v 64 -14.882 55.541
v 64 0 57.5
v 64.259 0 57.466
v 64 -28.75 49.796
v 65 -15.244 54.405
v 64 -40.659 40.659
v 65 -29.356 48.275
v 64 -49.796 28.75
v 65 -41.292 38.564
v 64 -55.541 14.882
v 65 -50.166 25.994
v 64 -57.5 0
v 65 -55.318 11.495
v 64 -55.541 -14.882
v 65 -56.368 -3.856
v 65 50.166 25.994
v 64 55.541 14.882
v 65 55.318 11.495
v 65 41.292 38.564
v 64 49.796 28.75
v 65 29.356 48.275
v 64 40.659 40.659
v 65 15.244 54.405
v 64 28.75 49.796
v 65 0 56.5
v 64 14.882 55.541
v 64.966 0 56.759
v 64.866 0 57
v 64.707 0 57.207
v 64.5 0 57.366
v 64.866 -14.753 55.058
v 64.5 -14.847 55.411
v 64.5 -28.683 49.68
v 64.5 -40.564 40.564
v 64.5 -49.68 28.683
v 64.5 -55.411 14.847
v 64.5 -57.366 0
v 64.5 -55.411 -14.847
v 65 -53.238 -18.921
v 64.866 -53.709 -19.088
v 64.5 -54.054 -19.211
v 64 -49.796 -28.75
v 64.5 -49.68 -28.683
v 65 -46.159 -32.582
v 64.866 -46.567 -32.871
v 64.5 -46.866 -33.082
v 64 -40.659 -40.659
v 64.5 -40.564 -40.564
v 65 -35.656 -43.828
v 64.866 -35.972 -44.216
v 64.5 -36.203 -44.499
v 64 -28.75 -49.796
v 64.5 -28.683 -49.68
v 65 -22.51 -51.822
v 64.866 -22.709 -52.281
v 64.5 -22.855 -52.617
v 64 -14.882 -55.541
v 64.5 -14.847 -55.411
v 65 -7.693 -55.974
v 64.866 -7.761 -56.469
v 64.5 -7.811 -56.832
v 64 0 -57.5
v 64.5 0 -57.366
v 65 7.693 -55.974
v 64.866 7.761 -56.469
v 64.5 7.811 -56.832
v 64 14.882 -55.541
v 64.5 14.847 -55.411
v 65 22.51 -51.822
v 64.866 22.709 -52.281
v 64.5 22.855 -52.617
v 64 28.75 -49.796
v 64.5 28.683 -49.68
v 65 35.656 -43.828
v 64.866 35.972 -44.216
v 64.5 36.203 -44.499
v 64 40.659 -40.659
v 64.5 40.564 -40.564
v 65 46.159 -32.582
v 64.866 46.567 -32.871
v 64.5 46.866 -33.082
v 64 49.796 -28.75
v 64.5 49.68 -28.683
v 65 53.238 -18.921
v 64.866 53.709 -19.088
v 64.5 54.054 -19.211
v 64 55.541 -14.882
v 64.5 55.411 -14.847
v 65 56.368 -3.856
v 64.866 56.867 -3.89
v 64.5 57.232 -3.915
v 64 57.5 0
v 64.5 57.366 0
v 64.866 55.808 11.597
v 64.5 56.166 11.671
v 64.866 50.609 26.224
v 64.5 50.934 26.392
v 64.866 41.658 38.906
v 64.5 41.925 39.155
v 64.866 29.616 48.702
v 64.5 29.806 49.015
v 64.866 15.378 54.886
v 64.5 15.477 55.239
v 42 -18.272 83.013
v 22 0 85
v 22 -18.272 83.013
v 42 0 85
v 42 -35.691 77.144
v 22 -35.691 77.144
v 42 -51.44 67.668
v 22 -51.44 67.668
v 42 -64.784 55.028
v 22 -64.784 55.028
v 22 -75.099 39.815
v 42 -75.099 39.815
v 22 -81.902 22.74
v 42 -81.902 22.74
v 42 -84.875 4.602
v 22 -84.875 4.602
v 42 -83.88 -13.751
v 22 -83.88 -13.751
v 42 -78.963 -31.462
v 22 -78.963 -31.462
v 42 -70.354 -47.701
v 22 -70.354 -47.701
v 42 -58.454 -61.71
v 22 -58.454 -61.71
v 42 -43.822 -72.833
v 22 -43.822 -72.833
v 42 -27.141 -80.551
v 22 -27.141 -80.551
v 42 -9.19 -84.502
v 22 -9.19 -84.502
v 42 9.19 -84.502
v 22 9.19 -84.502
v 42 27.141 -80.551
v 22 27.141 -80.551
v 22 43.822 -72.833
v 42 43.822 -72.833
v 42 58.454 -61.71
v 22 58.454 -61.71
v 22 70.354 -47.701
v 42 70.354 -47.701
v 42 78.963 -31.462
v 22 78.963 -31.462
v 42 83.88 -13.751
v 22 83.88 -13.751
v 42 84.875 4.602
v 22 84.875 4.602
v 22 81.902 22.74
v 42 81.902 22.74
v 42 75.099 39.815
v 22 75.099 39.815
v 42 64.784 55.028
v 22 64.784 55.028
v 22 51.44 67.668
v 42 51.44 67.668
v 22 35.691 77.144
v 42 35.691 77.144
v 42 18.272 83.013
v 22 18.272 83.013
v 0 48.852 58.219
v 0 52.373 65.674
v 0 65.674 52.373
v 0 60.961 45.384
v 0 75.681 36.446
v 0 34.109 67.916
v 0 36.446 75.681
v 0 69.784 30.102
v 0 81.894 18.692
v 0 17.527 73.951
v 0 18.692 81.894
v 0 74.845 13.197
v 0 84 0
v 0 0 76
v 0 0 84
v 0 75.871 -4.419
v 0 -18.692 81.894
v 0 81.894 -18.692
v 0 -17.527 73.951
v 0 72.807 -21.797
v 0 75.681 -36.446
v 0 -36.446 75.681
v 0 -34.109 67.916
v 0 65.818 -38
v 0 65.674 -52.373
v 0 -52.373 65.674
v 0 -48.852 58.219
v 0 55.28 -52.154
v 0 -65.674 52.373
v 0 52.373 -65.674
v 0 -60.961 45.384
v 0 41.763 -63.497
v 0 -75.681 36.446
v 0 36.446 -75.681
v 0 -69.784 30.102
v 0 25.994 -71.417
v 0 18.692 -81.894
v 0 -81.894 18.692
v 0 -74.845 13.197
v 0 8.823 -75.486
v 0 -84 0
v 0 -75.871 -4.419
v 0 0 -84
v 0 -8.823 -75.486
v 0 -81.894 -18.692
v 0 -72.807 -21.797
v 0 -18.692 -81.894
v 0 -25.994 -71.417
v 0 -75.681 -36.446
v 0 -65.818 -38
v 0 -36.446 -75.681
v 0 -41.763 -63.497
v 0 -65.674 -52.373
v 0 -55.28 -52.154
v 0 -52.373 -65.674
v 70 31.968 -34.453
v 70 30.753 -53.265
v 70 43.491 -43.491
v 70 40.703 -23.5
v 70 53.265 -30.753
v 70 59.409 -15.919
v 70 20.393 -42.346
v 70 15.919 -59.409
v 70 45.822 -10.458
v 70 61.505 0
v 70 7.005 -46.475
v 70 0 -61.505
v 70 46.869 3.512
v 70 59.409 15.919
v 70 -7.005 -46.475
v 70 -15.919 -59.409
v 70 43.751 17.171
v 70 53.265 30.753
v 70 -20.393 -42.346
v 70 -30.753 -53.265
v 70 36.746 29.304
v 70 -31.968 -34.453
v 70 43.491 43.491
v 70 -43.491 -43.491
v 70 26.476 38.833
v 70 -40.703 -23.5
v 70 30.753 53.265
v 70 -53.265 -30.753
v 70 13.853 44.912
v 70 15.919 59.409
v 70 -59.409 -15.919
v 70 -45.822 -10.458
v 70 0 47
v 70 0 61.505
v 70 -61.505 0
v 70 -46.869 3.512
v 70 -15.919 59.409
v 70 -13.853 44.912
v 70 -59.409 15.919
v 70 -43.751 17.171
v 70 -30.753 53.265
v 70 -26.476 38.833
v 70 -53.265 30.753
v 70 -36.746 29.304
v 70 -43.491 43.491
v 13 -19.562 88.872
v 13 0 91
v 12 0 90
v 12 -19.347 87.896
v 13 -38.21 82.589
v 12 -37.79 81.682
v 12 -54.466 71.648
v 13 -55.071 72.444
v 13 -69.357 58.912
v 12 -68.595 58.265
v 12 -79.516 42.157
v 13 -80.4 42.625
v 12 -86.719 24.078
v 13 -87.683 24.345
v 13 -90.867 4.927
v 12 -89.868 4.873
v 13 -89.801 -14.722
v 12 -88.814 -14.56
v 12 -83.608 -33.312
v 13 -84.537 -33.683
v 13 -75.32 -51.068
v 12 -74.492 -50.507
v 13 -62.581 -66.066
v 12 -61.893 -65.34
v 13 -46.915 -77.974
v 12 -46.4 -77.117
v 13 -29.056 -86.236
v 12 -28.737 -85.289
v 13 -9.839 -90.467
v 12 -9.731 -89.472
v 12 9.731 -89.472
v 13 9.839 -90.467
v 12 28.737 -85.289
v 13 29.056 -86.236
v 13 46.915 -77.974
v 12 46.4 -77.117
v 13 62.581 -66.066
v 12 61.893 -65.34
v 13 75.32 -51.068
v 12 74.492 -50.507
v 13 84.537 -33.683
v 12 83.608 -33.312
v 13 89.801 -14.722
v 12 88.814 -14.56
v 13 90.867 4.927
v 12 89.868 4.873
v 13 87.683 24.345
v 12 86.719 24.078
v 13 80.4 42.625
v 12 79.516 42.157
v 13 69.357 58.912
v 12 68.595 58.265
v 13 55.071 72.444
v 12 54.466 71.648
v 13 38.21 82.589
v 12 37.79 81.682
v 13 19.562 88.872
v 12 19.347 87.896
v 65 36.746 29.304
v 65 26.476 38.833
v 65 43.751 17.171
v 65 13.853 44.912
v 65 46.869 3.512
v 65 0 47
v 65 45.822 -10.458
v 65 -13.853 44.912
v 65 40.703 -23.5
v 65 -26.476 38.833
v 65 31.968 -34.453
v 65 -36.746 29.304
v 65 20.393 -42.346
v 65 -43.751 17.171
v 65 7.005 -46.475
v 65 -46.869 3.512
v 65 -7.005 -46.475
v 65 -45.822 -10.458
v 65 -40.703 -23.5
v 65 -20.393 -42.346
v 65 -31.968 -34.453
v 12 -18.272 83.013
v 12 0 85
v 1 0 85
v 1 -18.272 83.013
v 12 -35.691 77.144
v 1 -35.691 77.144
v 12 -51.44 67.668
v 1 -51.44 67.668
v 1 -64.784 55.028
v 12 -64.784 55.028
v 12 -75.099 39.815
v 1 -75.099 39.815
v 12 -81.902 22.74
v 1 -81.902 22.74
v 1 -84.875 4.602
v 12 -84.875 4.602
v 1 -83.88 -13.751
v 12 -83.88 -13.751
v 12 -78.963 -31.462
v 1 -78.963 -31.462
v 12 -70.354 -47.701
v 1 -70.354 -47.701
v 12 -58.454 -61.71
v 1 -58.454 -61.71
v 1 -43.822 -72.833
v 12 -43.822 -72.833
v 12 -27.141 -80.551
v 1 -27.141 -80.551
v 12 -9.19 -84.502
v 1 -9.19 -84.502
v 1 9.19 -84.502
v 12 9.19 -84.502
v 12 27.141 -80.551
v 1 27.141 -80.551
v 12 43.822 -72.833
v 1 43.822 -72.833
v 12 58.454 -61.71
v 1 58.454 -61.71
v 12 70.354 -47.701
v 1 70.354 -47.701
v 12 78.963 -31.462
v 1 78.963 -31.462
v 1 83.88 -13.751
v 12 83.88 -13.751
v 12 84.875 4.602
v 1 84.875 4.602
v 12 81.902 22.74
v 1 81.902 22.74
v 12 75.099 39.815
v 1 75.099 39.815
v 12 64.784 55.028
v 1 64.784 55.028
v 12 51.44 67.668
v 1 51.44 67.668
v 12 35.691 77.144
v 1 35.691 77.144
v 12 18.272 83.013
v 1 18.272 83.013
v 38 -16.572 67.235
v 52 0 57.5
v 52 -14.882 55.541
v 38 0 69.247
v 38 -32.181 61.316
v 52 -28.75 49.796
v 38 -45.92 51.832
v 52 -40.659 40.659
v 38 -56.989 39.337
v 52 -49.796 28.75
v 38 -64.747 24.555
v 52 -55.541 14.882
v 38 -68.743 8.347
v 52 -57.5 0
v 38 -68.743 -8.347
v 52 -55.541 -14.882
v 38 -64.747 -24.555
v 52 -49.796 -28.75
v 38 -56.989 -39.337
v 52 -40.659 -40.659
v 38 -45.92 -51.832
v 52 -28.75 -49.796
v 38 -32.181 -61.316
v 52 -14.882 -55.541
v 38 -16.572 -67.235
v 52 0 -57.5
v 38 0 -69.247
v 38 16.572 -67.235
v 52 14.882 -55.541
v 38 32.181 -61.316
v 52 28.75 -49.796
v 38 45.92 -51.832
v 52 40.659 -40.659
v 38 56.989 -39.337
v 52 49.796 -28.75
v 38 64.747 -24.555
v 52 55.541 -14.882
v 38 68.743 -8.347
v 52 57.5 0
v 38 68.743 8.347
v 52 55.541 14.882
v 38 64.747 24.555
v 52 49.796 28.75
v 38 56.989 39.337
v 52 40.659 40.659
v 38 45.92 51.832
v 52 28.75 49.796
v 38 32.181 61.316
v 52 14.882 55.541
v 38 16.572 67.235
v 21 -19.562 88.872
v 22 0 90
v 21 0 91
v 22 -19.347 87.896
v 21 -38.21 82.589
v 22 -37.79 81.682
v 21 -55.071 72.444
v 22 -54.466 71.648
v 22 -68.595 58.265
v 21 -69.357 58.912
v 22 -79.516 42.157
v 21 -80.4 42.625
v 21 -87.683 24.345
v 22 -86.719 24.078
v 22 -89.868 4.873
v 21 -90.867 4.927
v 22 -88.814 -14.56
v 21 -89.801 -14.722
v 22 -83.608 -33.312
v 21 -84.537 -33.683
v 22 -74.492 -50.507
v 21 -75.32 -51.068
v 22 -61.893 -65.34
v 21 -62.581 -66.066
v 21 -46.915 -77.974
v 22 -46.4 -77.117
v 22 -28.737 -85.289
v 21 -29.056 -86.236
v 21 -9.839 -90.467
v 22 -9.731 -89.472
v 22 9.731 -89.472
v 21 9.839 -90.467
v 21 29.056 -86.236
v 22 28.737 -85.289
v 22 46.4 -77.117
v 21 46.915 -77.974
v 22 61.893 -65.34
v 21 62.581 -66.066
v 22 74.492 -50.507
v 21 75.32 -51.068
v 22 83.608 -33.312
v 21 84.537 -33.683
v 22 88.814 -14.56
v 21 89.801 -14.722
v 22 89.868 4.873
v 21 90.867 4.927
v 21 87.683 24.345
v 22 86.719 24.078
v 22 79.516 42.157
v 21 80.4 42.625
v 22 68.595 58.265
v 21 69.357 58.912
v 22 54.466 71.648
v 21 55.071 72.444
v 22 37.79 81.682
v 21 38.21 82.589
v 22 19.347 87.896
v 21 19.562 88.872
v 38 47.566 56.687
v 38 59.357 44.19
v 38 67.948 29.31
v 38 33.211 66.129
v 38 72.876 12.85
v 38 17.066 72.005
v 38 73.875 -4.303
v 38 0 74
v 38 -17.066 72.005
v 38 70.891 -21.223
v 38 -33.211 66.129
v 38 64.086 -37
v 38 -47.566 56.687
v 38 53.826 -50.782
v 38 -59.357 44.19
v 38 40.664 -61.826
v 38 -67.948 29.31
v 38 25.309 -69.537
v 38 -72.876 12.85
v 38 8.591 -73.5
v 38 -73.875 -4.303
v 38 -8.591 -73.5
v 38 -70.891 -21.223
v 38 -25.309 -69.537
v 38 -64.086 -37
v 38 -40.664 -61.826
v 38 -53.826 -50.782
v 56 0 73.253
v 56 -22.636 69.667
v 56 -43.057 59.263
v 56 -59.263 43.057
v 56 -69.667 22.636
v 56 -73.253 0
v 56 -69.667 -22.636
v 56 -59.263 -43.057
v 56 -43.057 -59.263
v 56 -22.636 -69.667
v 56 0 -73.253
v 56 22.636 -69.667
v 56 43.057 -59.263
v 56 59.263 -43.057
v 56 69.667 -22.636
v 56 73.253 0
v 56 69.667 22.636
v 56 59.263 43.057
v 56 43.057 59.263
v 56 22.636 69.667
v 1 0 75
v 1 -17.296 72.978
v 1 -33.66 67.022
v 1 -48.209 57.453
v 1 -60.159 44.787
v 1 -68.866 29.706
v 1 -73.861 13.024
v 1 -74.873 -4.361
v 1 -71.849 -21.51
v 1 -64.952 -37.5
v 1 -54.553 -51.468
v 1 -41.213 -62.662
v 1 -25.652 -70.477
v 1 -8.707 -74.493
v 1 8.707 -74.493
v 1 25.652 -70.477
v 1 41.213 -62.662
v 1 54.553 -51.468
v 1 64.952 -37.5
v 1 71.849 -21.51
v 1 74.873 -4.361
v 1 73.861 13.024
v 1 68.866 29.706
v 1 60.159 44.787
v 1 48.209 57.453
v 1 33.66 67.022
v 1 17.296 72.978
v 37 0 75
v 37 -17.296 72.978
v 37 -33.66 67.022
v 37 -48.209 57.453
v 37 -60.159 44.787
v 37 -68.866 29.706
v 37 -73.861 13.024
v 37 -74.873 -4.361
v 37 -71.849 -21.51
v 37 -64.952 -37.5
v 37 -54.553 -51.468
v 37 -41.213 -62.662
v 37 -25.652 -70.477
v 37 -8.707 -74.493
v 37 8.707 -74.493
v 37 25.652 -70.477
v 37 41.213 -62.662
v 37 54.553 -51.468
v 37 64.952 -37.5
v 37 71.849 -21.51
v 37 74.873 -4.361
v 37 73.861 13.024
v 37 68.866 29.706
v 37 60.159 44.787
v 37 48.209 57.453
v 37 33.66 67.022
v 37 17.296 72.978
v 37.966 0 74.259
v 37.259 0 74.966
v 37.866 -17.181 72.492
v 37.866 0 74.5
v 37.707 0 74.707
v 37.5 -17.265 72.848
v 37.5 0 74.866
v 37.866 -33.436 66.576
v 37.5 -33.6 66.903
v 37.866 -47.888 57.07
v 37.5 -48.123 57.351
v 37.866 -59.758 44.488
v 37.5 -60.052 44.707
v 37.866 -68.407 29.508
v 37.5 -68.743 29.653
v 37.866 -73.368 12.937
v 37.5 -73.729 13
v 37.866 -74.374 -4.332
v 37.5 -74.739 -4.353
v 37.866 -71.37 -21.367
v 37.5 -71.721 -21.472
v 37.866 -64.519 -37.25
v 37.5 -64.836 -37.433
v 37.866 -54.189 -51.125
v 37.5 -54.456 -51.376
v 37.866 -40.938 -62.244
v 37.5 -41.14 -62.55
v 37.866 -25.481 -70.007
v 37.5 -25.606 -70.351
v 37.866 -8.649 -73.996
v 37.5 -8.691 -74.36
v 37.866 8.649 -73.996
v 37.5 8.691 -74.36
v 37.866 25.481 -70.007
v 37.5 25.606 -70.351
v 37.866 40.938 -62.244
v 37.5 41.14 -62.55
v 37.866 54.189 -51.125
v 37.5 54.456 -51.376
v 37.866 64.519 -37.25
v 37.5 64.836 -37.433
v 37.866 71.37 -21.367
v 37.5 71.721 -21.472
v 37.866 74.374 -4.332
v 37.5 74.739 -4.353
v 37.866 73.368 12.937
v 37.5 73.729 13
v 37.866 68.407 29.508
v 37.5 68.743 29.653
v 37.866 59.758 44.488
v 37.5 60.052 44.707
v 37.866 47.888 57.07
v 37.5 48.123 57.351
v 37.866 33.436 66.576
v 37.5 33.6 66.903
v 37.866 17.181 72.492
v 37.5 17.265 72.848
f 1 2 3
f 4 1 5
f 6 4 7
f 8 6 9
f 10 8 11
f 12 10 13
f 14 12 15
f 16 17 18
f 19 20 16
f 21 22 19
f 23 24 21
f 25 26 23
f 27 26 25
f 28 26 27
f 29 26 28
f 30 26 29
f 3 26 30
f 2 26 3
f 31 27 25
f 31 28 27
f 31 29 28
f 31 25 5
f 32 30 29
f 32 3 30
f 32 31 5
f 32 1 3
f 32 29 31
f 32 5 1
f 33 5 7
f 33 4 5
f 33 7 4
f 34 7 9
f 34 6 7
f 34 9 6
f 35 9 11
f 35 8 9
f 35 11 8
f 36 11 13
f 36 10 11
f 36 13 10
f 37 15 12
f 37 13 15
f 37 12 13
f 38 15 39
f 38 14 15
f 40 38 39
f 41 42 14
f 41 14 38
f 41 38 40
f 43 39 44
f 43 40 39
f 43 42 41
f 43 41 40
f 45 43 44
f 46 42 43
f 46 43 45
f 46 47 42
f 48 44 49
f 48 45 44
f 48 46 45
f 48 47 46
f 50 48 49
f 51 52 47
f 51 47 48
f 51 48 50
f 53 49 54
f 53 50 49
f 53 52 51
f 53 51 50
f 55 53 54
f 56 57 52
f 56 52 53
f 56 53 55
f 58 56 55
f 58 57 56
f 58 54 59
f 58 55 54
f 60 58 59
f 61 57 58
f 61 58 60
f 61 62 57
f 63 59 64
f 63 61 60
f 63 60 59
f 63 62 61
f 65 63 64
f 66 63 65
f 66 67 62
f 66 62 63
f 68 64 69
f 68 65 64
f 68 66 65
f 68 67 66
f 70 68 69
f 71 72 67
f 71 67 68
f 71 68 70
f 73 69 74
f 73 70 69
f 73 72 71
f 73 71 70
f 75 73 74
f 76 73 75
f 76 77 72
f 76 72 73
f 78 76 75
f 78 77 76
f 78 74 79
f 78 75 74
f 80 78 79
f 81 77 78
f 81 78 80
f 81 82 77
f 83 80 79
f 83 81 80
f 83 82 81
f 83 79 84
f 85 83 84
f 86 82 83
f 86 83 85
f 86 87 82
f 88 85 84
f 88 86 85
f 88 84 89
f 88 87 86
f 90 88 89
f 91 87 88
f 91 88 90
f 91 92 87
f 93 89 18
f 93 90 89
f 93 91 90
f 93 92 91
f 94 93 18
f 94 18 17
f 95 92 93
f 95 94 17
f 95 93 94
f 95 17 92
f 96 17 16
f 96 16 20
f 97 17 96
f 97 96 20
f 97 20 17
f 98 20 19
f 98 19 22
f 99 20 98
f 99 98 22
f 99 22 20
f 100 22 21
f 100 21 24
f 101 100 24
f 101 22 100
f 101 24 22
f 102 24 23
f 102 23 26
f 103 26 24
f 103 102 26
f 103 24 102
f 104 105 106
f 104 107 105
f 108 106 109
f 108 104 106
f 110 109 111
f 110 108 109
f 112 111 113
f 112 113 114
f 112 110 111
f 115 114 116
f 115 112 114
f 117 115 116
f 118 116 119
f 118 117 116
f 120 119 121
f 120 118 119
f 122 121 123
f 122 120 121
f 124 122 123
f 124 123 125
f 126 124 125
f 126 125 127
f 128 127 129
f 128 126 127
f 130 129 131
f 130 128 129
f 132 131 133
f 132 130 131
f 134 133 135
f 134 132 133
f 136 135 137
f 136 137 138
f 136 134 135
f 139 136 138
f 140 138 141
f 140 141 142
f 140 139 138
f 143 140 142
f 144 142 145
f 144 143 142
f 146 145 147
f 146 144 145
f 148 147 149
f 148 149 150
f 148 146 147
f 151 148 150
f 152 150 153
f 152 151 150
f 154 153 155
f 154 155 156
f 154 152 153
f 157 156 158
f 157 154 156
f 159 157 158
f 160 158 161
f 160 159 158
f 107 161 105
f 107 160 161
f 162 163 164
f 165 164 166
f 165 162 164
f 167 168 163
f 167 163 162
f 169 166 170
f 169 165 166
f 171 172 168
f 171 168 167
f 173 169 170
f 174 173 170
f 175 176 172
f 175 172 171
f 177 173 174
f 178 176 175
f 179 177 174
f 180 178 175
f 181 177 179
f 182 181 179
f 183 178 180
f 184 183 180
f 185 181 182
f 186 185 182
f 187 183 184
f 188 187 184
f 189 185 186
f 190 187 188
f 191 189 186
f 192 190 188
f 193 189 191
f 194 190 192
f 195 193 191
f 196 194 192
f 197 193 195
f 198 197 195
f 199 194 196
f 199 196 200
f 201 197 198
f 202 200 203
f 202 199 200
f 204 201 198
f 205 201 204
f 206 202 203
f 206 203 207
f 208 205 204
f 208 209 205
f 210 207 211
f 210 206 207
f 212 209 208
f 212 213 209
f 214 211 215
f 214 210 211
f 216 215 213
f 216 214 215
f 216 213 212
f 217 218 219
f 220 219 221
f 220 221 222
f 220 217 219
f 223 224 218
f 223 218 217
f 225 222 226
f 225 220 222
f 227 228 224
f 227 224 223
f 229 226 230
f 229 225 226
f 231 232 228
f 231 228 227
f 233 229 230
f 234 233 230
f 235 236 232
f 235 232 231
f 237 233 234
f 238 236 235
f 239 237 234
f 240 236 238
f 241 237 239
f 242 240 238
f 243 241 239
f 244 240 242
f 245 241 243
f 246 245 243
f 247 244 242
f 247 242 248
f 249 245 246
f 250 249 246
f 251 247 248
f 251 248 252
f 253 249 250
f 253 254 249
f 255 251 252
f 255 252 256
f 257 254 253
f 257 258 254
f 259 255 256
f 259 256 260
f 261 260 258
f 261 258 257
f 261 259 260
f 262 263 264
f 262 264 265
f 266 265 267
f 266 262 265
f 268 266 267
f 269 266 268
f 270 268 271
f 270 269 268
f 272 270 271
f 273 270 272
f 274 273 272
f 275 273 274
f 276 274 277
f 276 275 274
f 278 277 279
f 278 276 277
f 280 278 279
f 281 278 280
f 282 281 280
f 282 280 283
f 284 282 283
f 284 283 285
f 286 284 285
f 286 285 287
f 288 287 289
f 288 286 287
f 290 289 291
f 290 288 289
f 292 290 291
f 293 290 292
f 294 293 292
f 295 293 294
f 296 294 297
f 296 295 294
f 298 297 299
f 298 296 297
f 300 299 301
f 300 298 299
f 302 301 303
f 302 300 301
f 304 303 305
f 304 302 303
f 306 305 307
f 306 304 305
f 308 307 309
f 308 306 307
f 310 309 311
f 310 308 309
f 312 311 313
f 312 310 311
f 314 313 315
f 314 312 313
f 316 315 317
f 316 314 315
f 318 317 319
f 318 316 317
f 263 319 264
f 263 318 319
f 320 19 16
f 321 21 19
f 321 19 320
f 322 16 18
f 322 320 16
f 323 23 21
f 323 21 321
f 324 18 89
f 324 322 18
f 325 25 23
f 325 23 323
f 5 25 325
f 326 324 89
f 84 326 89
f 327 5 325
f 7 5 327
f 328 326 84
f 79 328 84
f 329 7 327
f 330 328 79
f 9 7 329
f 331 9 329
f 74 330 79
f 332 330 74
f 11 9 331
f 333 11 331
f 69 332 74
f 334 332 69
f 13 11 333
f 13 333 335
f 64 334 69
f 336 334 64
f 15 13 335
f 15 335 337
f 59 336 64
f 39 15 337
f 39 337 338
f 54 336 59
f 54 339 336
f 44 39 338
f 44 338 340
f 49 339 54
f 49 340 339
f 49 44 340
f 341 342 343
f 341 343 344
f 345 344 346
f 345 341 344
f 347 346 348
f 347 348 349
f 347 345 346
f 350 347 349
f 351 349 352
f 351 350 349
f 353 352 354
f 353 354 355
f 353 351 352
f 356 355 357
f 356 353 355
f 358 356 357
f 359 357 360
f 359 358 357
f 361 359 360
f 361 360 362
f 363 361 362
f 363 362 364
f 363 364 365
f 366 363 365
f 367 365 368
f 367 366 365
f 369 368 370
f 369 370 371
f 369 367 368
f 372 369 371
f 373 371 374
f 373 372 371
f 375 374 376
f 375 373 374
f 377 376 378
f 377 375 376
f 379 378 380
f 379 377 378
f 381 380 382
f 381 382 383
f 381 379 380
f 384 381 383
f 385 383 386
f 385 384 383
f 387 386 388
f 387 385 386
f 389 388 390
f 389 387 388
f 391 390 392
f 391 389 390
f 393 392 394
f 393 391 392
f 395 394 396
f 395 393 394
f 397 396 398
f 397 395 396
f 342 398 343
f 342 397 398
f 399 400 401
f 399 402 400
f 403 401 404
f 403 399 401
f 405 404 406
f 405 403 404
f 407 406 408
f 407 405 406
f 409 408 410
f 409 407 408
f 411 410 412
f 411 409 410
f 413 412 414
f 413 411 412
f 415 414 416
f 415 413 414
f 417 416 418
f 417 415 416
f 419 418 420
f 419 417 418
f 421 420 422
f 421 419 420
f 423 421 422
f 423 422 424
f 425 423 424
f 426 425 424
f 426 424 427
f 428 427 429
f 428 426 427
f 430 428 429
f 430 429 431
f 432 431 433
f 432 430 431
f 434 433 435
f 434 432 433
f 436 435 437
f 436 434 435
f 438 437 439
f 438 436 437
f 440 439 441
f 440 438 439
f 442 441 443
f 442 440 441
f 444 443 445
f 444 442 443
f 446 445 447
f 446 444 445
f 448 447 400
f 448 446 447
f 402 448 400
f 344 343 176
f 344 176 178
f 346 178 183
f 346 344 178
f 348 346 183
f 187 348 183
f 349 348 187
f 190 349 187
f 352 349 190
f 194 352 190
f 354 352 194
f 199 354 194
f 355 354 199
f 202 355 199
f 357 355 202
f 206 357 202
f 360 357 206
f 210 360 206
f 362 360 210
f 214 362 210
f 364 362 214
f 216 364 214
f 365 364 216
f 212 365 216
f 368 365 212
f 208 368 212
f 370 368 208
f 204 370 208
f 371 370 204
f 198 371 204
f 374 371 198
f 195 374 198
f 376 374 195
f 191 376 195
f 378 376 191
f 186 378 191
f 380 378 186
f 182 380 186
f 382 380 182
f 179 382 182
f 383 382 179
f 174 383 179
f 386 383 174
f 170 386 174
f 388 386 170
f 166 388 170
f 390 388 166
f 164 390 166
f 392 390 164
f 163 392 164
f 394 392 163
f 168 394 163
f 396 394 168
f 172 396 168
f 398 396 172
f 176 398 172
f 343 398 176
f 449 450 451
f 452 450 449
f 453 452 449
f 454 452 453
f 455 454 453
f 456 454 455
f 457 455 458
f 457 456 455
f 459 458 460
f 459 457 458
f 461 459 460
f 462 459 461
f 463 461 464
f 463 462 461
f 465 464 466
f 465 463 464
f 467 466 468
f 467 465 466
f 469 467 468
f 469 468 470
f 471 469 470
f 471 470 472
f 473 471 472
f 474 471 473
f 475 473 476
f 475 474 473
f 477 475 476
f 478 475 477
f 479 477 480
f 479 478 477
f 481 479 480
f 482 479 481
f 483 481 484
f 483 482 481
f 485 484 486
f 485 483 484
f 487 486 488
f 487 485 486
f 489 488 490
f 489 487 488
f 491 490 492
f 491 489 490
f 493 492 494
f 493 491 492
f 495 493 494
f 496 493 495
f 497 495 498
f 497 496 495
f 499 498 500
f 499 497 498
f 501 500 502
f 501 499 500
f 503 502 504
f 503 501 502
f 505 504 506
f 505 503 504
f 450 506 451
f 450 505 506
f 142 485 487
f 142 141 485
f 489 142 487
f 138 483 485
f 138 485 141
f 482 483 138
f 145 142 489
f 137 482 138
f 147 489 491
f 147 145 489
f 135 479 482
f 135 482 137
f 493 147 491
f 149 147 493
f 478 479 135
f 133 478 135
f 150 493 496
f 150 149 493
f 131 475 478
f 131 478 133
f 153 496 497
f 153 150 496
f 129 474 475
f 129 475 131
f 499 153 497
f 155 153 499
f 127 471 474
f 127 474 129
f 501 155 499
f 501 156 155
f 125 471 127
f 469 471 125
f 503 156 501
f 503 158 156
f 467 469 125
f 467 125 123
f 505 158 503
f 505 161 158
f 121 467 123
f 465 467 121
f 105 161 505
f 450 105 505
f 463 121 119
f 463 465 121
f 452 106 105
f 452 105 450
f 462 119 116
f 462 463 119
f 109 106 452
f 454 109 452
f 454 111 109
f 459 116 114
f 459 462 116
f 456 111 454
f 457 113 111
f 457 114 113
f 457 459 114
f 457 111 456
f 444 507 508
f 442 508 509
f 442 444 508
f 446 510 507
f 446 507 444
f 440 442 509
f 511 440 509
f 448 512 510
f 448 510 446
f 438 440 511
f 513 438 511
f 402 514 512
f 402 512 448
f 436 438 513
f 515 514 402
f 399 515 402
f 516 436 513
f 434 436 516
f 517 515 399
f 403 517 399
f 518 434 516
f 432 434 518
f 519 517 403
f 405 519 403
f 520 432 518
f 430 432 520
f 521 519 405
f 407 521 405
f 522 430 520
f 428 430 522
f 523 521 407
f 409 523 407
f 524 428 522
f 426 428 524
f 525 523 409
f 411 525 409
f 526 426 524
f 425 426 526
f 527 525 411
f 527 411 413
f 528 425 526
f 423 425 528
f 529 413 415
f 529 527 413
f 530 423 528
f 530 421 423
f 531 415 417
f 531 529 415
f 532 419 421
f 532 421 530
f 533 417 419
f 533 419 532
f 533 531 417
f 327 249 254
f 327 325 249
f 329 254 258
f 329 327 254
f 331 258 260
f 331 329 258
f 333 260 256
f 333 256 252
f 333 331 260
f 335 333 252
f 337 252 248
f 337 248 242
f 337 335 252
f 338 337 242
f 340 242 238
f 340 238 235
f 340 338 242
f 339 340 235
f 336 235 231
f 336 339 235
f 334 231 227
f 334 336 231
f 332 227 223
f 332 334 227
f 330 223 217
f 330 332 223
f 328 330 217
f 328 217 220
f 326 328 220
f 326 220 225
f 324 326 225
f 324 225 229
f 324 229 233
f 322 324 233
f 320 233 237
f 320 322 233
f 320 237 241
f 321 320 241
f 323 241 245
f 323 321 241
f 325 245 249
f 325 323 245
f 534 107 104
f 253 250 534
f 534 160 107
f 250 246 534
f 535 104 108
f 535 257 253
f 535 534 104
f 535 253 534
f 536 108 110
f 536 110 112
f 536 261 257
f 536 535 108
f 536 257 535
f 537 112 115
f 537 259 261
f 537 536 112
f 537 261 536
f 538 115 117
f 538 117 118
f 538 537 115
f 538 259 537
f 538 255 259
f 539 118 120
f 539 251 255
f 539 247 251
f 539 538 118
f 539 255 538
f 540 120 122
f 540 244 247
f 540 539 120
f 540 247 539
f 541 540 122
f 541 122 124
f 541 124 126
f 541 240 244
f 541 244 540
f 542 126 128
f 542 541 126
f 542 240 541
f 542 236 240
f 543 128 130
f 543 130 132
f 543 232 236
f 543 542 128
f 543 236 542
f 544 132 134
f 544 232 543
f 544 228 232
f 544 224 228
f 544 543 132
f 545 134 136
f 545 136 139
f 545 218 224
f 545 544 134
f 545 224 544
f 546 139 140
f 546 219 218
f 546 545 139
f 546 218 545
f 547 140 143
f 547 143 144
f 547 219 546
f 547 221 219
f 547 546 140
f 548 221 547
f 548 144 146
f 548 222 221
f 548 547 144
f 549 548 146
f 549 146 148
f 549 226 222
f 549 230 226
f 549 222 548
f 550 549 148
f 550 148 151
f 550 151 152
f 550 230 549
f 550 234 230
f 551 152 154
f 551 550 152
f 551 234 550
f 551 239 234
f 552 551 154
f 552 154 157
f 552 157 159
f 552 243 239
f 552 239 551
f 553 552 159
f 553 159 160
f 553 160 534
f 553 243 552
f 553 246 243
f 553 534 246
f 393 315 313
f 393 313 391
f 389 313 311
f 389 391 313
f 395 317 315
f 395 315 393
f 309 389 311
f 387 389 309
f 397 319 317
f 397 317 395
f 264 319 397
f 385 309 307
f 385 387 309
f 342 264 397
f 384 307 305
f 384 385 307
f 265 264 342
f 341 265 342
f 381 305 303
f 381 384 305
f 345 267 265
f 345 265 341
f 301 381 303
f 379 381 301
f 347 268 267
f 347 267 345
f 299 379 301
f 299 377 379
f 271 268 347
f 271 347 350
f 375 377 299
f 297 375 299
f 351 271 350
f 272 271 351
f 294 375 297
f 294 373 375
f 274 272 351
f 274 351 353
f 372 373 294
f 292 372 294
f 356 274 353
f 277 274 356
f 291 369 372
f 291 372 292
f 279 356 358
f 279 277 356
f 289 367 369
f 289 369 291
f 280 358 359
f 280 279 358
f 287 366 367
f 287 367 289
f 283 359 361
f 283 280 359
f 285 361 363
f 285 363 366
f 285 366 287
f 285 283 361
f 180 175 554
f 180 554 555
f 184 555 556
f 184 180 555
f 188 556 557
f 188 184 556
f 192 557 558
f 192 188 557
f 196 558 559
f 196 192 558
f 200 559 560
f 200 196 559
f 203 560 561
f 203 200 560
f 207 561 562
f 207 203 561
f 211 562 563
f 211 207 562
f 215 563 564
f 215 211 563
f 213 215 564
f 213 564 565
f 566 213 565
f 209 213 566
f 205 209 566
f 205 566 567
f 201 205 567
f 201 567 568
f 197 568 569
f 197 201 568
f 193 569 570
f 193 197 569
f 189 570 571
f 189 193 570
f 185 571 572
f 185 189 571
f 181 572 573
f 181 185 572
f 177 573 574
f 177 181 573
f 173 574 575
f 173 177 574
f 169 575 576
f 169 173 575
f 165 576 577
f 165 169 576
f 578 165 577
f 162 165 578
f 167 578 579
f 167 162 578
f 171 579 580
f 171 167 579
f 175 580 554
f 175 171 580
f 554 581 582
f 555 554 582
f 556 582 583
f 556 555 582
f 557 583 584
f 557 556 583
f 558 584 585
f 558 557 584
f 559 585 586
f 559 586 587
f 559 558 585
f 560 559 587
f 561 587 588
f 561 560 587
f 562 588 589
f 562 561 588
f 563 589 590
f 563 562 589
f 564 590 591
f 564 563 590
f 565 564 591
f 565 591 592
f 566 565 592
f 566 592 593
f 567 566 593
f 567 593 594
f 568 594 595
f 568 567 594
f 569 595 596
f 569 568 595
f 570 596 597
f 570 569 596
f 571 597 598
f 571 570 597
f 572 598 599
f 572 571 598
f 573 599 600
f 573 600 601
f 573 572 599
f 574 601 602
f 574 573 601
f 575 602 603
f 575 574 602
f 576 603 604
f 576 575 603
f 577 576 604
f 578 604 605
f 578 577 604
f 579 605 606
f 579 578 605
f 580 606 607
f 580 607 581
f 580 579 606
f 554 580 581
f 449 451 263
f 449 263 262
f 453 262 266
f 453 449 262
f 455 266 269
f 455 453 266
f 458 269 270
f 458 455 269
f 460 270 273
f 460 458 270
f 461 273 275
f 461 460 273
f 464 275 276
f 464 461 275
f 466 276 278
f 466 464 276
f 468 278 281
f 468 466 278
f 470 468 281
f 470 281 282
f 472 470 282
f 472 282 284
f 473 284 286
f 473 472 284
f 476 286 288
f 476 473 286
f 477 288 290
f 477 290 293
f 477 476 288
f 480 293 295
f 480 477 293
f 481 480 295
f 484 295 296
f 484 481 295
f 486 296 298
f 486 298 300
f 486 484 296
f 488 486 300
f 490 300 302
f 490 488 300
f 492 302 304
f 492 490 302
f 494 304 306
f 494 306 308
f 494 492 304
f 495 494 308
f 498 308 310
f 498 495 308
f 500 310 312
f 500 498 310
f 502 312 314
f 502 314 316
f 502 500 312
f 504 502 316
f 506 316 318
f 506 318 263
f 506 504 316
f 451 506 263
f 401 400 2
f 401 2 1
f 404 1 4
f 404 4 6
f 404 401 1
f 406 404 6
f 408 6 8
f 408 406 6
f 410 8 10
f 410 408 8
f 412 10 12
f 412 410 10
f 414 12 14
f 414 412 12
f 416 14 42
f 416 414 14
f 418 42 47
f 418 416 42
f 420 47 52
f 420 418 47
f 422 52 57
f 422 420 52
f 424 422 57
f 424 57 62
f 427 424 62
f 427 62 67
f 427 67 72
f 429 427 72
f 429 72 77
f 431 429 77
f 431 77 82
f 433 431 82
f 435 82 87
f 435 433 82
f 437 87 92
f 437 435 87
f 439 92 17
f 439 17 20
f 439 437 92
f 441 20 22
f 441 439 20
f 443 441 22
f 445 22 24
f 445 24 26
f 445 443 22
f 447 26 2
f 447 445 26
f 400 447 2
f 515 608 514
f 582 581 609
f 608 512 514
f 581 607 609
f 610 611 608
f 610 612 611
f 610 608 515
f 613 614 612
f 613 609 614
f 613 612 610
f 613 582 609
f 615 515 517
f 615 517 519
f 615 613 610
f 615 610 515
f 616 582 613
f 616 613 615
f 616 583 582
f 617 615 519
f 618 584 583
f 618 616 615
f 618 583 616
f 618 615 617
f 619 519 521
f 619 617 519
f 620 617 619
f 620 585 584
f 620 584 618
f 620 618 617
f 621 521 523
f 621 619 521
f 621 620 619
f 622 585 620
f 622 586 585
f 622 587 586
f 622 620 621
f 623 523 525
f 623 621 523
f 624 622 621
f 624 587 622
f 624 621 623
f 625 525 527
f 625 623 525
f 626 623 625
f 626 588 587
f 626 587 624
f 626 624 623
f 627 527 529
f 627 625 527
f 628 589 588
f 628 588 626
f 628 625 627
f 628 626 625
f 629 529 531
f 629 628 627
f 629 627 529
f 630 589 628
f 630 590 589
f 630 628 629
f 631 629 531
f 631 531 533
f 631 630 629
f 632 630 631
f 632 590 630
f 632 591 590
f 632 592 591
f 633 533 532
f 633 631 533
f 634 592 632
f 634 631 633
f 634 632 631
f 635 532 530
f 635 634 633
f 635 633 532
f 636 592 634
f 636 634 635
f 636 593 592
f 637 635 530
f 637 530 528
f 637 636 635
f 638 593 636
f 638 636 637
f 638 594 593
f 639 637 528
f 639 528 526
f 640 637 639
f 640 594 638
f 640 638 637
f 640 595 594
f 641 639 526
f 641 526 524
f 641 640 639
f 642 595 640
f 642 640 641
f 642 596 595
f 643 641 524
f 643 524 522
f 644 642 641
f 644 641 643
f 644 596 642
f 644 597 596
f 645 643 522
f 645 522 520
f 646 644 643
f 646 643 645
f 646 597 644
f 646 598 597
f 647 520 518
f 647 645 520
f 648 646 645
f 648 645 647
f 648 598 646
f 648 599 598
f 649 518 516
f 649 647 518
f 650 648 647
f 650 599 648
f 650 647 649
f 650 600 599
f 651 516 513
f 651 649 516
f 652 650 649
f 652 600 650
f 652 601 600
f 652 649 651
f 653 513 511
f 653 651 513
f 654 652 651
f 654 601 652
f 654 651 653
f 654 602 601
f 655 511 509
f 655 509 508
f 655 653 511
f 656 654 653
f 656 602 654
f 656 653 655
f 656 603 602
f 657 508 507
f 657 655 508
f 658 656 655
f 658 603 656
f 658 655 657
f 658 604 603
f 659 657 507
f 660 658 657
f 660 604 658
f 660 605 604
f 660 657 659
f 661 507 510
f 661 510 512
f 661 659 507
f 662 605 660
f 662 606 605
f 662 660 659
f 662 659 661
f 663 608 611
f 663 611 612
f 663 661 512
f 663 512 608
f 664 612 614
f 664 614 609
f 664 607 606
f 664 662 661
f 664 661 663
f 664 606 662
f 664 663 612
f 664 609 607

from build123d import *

# Parameters (mm, degrees)
ZAOKR_GLENIE1_R  = 1
ZAOKR_GLENIE2_R  = 1
SFAZOWANIE1_SIZE = 1


with BuildPart() as part:
    # Szkic1 → Obrót1 (revolve)
    with BuildSketch(Plane.XY, mode=Mode.PRIVATE) as obr_t1_sk:
        Polygon((70, 47), (65, 47), (65, 57.5), (52, 57.5), (38, 69.247394836), (38, 75), (0, 75), (0, 85), (12, 85), (12, 91), (22, 91), (22, 85), (42, 85), (70, 61.505210327), align=None)
    revolve(obr_t1_sk.sketch.rotate(Axis((0, 0, 0), (1, 0, 0)), 90), axis=Axis((0, 0, 0), (1, 0, 0)))  # turned: the seam where the file's is

    # Zaokrąglenie1
    zaokr_glenie1_edges = [part.edges().sort_by_distance(p)[0] for p in [
        (65, 0, -57.5),
    ]]
    fillet(zaokr_glenie1_edges, radius=ZAOKR_GLENIE1_R)

    # Zaokrąglenie2
    zaokr_glenie2_edges = [part.edges().sort_by_distance(p)[0] for p in [
        (38, 0, -75),
    ]]
    fillet(zaokr_glenie2_edges, radius=ZAOKR_GLENIE2_R)

    # Sfazowanie1
    sfazowanie1_edges = [part.edges().sort_by_distance(p)[0] for p in [
        (22, 0, -91),
        (12, 0, -91),
        (0, 0, -85),
        (0, 0, -75),
    ]]
    chamfer(sfazowanie1_edges, length=SFAZOWANIE1_SIZE)


solid = part.part
